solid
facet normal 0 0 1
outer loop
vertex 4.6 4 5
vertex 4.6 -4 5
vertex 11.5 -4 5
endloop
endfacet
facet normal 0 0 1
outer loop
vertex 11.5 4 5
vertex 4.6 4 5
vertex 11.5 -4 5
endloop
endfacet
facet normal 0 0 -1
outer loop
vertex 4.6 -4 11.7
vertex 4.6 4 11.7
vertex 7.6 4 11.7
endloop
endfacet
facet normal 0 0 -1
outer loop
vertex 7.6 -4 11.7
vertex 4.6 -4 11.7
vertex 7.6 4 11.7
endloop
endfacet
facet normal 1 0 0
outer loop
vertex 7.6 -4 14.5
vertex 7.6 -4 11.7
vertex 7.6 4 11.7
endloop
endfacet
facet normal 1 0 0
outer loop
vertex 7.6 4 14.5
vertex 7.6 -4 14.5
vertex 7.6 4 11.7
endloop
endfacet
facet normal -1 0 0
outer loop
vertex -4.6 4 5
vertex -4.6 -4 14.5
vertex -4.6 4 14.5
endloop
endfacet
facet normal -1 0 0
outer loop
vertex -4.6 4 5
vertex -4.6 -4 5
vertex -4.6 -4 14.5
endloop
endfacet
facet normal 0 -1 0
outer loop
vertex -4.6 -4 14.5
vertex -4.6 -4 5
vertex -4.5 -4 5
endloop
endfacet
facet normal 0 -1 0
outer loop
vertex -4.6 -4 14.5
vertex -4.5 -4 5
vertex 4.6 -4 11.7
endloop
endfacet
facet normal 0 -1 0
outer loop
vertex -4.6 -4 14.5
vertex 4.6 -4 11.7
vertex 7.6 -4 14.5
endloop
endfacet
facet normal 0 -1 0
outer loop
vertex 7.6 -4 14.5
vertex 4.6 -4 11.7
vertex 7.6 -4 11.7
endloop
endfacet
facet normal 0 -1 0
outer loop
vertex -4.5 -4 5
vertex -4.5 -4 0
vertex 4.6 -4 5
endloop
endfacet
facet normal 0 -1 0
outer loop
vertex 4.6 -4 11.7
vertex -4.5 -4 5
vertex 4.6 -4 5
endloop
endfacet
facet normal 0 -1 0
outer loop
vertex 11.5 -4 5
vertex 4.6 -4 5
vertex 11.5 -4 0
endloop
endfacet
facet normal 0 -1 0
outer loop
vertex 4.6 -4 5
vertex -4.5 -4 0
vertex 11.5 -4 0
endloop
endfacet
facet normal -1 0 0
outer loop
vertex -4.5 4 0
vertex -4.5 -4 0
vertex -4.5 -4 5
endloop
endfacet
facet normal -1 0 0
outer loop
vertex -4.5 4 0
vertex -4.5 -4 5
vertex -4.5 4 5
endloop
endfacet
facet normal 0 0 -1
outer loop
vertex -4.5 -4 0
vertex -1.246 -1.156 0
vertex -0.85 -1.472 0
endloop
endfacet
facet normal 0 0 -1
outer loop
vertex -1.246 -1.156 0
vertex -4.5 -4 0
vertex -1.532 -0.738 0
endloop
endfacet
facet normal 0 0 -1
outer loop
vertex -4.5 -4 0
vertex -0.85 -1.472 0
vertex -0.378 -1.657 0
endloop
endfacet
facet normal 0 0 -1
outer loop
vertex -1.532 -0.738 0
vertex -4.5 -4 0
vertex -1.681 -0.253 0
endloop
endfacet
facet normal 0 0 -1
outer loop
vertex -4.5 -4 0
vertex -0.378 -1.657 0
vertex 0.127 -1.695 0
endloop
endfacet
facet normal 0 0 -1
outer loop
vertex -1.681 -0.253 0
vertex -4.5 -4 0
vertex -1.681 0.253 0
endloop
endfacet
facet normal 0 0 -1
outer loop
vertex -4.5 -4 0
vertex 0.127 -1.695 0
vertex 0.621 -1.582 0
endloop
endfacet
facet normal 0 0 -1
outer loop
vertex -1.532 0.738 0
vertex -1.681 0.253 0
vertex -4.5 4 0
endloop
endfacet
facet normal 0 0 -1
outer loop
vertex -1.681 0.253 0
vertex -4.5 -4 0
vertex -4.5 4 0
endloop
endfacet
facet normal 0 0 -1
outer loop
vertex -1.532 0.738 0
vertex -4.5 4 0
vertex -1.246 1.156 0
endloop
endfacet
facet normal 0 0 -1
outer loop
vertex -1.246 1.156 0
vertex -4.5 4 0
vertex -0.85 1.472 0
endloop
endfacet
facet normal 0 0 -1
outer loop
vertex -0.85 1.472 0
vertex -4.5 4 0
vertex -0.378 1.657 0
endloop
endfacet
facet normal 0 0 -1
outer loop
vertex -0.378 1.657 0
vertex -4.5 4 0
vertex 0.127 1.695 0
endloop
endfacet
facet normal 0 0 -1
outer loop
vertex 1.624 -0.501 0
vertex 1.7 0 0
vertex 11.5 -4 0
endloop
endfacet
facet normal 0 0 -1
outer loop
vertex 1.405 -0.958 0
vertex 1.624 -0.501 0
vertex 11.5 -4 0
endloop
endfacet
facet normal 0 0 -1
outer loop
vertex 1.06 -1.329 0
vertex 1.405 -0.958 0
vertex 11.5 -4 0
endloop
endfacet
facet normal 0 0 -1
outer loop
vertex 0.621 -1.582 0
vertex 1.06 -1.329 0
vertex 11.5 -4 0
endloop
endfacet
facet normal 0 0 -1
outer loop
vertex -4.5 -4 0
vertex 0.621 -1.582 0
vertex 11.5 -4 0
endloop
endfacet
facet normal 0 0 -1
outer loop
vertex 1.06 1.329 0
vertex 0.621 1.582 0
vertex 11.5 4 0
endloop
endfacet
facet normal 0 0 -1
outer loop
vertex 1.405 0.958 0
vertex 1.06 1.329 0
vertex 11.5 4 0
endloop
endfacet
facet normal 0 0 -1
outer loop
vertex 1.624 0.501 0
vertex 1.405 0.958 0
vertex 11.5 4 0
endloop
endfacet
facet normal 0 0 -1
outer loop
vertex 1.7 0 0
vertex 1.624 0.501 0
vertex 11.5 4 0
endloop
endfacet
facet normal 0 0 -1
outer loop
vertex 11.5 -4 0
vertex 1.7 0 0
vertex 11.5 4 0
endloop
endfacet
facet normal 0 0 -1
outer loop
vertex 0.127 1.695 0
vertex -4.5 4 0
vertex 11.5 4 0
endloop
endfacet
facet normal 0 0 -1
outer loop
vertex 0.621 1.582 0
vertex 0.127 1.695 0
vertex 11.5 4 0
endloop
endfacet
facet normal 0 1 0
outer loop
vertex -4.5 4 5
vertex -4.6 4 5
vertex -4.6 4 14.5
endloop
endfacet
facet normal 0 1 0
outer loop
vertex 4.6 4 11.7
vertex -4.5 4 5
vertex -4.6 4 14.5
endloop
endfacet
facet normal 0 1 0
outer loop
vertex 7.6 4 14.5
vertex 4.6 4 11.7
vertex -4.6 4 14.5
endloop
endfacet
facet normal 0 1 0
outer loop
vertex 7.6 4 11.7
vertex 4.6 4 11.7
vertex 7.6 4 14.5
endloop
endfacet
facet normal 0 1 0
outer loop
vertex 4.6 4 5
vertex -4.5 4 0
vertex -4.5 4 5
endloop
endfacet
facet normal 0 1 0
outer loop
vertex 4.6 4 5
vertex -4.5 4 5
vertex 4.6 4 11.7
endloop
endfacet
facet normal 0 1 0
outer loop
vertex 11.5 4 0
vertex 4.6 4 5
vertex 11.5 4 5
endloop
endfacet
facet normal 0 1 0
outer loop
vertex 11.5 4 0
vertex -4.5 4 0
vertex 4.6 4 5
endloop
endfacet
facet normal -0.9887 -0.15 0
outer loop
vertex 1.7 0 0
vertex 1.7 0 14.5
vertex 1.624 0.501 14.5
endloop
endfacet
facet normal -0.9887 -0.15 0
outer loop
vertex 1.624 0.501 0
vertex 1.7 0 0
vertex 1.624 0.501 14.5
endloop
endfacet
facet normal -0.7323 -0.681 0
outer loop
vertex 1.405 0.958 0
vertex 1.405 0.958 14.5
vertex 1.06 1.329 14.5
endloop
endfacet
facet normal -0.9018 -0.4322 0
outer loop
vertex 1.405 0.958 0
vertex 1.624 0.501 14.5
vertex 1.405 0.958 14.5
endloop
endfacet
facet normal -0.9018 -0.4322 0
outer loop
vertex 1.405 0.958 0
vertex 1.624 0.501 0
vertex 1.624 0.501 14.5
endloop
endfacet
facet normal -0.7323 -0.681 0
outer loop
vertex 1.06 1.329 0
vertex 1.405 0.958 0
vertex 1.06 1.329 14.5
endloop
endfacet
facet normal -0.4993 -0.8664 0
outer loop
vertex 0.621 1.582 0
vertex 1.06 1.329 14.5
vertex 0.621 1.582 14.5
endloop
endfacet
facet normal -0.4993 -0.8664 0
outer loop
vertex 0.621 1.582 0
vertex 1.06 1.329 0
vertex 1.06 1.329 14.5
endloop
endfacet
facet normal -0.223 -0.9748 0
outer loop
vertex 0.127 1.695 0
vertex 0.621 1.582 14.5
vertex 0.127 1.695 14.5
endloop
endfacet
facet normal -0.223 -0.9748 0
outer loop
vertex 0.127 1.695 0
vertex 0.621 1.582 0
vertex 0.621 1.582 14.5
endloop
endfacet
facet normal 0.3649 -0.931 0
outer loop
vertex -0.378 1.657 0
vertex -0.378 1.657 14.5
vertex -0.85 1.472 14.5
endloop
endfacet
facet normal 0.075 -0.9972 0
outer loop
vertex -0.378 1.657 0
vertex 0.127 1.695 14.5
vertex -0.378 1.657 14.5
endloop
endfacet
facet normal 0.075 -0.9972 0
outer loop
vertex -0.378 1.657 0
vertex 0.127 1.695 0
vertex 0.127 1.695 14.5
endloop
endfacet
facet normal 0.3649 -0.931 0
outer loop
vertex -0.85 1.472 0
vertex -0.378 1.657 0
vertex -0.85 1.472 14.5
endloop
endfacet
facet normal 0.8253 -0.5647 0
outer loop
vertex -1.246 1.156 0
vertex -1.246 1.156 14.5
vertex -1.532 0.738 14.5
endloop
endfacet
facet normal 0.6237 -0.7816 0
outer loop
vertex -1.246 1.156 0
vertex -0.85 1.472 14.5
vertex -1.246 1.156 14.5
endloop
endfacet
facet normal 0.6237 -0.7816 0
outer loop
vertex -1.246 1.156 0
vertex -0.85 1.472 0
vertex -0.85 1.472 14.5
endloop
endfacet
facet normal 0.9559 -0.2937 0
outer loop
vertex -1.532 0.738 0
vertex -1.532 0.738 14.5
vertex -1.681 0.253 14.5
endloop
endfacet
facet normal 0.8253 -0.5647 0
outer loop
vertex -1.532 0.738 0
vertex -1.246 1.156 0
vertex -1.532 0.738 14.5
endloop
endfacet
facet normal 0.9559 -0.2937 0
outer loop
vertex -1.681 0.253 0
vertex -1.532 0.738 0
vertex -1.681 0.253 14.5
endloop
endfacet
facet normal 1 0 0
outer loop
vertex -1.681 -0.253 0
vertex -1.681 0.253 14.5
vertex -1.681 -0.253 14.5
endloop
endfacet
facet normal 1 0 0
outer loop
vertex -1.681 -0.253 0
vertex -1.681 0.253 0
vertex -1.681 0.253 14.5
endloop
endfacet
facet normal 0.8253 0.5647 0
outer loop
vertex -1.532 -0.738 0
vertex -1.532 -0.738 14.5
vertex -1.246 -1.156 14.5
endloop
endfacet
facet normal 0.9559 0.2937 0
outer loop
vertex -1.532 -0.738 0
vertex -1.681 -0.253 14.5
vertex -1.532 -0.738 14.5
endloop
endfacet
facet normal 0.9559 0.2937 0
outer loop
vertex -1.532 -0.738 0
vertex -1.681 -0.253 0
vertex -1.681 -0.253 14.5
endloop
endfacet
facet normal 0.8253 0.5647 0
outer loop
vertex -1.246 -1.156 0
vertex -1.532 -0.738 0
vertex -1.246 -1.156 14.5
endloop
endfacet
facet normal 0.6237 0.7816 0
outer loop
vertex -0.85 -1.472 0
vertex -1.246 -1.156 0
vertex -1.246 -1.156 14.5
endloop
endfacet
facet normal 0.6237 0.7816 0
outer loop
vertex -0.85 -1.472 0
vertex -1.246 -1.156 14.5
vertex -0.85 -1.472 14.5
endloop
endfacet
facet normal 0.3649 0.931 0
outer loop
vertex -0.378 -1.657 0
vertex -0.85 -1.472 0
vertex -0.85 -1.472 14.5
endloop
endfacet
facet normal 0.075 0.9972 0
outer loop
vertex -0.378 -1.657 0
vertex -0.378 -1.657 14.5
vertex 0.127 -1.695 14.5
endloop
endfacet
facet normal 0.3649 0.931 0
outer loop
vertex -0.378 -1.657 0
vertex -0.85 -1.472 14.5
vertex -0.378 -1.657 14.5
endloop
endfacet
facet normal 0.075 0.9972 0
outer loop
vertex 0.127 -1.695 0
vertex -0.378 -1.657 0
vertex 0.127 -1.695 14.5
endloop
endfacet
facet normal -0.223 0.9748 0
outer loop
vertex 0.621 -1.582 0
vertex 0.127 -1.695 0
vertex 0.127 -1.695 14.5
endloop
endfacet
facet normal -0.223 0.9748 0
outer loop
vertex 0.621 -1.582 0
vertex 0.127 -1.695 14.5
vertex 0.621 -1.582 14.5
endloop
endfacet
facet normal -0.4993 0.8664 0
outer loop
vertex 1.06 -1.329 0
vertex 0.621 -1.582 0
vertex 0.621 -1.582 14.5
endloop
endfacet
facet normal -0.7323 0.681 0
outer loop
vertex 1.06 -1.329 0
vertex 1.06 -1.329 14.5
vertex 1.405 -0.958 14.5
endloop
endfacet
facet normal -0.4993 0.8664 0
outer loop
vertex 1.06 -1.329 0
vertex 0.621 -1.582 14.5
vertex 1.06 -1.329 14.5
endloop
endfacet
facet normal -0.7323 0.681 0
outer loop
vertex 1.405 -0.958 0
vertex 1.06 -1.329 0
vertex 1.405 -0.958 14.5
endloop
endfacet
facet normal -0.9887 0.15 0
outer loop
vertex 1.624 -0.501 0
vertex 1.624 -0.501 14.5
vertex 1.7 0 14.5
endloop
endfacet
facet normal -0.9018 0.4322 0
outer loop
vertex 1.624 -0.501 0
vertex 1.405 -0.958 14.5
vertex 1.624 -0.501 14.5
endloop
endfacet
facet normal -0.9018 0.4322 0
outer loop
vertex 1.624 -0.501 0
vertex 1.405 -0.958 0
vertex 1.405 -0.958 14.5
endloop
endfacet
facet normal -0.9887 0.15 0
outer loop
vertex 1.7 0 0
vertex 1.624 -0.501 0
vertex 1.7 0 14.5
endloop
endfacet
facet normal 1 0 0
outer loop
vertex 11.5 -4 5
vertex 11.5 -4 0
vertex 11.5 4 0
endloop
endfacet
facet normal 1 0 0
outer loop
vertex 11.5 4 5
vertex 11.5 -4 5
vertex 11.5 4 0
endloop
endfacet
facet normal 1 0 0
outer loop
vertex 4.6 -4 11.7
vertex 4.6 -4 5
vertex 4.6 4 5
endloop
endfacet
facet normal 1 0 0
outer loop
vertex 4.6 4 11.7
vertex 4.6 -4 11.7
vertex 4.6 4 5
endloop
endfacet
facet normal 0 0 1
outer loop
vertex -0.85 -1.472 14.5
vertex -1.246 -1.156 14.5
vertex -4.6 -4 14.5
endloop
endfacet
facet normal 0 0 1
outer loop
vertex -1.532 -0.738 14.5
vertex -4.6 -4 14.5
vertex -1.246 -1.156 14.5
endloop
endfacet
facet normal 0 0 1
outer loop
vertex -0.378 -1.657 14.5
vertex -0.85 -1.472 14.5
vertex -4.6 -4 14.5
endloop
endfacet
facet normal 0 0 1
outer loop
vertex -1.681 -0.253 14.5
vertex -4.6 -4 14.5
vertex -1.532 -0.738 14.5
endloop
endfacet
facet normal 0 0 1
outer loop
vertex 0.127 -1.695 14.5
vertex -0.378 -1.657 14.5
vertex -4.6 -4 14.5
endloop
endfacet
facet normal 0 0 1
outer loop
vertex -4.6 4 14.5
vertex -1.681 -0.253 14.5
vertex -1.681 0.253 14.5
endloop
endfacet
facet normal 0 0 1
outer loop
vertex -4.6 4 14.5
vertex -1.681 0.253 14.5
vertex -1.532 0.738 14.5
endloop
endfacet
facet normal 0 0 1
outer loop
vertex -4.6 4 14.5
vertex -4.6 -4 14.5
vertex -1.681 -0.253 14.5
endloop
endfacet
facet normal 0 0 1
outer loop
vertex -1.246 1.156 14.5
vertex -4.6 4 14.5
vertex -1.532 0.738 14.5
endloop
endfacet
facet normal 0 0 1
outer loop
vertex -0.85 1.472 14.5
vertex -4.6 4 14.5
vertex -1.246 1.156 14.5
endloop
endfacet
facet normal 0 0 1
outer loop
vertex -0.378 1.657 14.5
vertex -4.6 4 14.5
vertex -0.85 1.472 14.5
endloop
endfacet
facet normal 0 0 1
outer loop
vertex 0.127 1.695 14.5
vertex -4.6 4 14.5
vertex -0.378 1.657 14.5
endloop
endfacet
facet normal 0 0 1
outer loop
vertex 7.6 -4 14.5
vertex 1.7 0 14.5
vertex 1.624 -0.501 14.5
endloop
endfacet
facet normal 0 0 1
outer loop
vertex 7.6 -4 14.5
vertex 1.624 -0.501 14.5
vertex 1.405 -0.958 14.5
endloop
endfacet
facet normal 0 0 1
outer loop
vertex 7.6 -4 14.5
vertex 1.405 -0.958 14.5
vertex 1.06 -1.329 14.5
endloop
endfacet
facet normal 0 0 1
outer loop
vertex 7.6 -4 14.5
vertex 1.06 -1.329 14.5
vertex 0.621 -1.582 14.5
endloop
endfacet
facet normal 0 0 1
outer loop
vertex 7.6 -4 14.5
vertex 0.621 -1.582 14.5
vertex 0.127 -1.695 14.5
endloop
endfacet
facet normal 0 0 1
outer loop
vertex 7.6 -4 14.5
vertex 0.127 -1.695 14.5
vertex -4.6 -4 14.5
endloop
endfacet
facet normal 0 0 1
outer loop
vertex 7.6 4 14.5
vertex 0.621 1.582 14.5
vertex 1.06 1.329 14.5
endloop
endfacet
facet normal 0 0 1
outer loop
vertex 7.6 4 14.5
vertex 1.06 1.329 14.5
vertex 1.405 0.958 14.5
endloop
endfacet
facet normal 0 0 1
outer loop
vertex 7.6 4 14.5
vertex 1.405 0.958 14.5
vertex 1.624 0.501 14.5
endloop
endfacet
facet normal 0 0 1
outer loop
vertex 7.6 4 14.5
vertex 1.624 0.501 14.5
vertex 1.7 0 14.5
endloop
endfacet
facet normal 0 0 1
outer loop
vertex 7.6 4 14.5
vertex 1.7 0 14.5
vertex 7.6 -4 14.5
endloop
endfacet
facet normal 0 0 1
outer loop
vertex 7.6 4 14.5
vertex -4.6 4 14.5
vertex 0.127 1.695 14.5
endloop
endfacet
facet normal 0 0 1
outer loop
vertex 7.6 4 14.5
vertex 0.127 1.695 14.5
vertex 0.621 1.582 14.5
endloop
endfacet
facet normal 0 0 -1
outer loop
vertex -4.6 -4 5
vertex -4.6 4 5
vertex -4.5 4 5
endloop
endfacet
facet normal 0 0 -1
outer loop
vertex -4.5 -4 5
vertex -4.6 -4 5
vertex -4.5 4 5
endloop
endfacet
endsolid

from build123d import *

# Parameters (mm, degrees)
SKETCH_FOOT_AND_SUPPORT_SHELF_W = 16
SKETCH_FOOT_AND_SUPPORT_SHELF_H = 8
FOOT_AND_SUPPORT_SHELF_DEPTH    = 5
CLAMP_UPRIGHT_START             = 5
SKETCH_CLAMP_UPRIGHT_W          = 9.2
SKETCH_CLAMP_UPRIGHT_H          = 8
CLAMP_UPRIGHT_DEPTH             = 6.7
CORNER_RETAINING_LIP_START      = 11.7
SKETCH_CORNER_RETAINING_LIP_W   = 12.2
SKETCH_CORNER_RETAINING_LIP_H   = 8
CORNER_RETAINING_LIP_DEPTH      = 2.8
M3_THROUGH_START                = -1
SKETCH_M3_THROUGH_R             = 1.7
M3_THROUGH_DEPTH                = 17


with BuildPart() as part:
    # Sketch_Foot_and_support_shelf → Foot_and_support_shelf (new body)
    with BuildSketch(Plane.XY):
        with Locations((3.5, 0)):
            Rectangle(SKETCH_FOOT_AND_SUPPORT_SHELF_W, SKETCH_FOOT_AND_SUPPORT_SHELF_H)
    extrude(amount=FOOT_AND_SUPPORT_SHELF_DEPTH)

    # Sketch_Clamp_upright → Clamp_upright (add)
    with BuildSketch(Plane.XY.offset(CLAMP_UPRIGHT_START)):
        Rectangle(SKETCH_CLAMP_UPRIGHT_W, SKETCH_CLAMP_UPRIGHT_H)
    extrude(amount=CLAMP_UPRIGHT_DEPTH)

    # Sketch_Corner_retaining_lip → Corner_retaining_lip (add)
    with BuildSketch(Plane.XY.offset(CORNER_RETAINING_LIP_START)):
        with Locations((1.5, 0)):
            Rectangle(SKETCH_CORNER_RETAINING_LIP_W, SKETCH_CORNER_RETAINING_LIP_H)
    extrude(amount=CORNER_RETAINING_LIP_DEPTH)

    # Sketch_M3_through → M3_through (cut)
    with BuildSketch(Plane.XY.offset(M3_THROUGH_START)):
        Circle(SKETCH_M3_THROUGH_R)
    extrude(amount=M3_THROUGH_DEPTH, mode=Mode.SUBTRACT)


solid = part.part
